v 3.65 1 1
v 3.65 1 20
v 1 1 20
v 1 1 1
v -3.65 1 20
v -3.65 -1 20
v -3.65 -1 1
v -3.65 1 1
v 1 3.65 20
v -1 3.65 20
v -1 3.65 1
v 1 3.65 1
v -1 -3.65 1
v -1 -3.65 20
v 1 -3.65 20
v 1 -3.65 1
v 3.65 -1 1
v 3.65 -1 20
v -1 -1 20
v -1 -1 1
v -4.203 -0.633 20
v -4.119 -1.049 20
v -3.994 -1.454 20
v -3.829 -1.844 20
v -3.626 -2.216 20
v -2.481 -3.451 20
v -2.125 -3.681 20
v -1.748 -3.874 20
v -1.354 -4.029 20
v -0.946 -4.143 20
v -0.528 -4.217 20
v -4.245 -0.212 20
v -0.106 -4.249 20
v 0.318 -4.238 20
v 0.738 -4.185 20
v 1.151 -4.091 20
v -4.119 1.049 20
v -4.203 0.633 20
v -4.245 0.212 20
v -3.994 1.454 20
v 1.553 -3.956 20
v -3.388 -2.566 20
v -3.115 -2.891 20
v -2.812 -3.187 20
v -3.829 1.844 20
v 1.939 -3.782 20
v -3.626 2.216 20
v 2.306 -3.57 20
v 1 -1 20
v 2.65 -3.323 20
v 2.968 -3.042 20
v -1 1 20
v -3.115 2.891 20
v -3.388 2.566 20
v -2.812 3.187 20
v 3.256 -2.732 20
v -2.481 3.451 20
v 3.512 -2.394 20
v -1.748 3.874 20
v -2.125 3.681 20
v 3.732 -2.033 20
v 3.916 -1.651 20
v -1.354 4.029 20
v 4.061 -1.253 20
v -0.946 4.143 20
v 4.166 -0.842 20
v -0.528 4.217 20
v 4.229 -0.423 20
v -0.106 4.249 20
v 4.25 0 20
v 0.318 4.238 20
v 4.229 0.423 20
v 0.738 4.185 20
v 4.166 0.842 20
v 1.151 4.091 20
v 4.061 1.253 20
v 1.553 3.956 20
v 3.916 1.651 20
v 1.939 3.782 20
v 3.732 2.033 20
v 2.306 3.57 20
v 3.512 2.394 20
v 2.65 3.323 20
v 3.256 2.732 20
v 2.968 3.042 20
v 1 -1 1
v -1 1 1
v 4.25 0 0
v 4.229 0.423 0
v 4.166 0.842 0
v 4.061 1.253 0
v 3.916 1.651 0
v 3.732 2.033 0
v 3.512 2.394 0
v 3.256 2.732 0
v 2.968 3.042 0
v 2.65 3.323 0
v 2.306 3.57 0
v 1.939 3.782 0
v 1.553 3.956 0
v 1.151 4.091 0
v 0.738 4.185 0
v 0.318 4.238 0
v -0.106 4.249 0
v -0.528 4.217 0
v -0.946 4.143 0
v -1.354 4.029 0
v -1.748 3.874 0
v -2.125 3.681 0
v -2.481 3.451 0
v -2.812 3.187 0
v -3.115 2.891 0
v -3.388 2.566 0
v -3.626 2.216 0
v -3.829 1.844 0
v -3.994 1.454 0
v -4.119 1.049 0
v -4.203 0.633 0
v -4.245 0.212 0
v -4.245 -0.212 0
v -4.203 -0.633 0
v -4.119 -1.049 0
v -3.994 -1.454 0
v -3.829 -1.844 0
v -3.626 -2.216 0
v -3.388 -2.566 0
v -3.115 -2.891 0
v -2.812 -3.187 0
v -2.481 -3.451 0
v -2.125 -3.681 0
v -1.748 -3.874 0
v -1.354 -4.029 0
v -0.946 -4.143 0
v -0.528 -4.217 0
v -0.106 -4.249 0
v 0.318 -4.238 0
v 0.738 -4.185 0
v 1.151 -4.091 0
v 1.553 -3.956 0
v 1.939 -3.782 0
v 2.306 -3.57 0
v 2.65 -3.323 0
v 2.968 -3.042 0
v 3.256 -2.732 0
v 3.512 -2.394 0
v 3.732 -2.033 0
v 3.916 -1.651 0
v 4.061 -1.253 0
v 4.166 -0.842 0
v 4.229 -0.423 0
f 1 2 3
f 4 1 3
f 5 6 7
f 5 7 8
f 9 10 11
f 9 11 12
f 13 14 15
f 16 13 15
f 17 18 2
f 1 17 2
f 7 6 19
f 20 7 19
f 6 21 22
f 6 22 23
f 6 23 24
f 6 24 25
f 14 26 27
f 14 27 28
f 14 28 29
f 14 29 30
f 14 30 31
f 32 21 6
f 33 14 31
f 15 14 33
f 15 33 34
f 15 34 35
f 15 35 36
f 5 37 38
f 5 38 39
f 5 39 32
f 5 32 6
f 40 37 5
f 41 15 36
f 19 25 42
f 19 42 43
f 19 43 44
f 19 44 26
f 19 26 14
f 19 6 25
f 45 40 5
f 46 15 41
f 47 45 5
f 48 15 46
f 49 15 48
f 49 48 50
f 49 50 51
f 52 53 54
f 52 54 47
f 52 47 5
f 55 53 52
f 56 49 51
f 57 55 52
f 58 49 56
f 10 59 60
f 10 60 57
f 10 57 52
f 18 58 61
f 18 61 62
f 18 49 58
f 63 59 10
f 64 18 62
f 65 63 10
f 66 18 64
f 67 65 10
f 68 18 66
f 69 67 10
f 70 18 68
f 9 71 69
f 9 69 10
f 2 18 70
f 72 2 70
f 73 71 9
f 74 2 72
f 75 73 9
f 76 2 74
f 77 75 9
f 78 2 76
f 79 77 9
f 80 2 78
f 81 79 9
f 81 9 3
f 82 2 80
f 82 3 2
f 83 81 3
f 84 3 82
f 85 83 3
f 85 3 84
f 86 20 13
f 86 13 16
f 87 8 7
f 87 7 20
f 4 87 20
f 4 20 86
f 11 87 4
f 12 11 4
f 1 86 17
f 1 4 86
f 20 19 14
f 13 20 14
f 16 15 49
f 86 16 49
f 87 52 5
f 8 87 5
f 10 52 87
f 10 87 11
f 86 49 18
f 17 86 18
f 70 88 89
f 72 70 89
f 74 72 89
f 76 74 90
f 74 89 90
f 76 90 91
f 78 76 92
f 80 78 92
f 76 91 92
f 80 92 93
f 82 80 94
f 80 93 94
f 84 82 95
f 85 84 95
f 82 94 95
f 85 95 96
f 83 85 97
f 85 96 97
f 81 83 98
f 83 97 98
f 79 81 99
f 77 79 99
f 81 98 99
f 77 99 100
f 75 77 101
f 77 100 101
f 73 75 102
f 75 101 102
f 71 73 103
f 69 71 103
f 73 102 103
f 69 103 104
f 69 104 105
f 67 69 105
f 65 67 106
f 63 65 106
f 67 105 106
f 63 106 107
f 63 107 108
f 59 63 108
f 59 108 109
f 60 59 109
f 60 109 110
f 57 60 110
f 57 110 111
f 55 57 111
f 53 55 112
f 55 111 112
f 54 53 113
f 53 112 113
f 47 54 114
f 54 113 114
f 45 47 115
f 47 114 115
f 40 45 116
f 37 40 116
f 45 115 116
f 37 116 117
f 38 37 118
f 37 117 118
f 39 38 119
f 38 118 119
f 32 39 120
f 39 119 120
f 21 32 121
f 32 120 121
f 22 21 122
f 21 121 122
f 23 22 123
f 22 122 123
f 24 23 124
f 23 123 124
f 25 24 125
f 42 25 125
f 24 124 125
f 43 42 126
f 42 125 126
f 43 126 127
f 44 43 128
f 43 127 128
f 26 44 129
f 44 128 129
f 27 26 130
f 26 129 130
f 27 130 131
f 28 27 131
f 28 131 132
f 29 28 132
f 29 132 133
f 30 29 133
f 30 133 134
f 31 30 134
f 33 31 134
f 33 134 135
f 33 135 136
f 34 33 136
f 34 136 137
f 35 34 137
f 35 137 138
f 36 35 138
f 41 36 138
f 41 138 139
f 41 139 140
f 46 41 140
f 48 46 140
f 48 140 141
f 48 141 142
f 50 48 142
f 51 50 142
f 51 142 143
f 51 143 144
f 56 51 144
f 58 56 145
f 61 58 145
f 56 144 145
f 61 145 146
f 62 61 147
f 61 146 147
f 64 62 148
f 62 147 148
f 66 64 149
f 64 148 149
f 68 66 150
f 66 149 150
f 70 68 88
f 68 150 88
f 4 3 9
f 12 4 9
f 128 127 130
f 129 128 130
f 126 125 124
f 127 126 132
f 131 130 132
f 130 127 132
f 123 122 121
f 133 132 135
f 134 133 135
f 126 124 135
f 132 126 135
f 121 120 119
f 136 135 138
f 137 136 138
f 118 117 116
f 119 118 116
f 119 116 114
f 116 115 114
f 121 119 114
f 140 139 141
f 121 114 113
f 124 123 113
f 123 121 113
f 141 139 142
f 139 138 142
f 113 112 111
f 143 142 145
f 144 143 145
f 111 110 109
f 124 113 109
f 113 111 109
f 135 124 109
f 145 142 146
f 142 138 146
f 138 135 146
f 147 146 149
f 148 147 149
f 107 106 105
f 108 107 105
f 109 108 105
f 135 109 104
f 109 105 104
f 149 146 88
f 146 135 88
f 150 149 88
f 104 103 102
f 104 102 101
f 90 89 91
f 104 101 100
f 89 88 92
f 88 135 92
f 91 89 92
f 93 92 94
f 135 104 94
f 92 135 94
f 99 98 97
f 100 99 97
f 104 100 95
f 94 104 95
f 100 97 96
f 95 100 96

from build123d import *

# Parameters (mm, degrees)
F0_R     = 4.25
F1_DEPTH = 20
F2_W     = 2.65
F2_H     = 2
F2_W_2   = 2
F2_H_2   = 2.65
F3_DEPTH = 19


with BuildPart() as f1:
    # F0 (on Top) → F1 (new body)
    with BuildSketch(Plane.XY):
        Circle(F0_R)
    extrude(amount=F1_DEPTH)

    # F2 (on face) → F3 (cut)
    with BuildSketch(Plane.XY.offset(20)):
        with Locations((2.325, 0)):
            Rectangle(F2_W, F2_H)
        with Locations((0, -2.325)):
            Rectangle(F2_W_2, F2_H_2)
        Rectangle(F2_W_2, F2_H)
        with Locations((-2.325, 0)):
            Rectangle(F2_W, F2_H)
        with Locations((0, 2.325)):
            Rectangle(F2_W_2, F2_H_2)
    extrude(amount=-F3_DEPTH, mode=Mode.SUBTRACT)


solid = f1.part
